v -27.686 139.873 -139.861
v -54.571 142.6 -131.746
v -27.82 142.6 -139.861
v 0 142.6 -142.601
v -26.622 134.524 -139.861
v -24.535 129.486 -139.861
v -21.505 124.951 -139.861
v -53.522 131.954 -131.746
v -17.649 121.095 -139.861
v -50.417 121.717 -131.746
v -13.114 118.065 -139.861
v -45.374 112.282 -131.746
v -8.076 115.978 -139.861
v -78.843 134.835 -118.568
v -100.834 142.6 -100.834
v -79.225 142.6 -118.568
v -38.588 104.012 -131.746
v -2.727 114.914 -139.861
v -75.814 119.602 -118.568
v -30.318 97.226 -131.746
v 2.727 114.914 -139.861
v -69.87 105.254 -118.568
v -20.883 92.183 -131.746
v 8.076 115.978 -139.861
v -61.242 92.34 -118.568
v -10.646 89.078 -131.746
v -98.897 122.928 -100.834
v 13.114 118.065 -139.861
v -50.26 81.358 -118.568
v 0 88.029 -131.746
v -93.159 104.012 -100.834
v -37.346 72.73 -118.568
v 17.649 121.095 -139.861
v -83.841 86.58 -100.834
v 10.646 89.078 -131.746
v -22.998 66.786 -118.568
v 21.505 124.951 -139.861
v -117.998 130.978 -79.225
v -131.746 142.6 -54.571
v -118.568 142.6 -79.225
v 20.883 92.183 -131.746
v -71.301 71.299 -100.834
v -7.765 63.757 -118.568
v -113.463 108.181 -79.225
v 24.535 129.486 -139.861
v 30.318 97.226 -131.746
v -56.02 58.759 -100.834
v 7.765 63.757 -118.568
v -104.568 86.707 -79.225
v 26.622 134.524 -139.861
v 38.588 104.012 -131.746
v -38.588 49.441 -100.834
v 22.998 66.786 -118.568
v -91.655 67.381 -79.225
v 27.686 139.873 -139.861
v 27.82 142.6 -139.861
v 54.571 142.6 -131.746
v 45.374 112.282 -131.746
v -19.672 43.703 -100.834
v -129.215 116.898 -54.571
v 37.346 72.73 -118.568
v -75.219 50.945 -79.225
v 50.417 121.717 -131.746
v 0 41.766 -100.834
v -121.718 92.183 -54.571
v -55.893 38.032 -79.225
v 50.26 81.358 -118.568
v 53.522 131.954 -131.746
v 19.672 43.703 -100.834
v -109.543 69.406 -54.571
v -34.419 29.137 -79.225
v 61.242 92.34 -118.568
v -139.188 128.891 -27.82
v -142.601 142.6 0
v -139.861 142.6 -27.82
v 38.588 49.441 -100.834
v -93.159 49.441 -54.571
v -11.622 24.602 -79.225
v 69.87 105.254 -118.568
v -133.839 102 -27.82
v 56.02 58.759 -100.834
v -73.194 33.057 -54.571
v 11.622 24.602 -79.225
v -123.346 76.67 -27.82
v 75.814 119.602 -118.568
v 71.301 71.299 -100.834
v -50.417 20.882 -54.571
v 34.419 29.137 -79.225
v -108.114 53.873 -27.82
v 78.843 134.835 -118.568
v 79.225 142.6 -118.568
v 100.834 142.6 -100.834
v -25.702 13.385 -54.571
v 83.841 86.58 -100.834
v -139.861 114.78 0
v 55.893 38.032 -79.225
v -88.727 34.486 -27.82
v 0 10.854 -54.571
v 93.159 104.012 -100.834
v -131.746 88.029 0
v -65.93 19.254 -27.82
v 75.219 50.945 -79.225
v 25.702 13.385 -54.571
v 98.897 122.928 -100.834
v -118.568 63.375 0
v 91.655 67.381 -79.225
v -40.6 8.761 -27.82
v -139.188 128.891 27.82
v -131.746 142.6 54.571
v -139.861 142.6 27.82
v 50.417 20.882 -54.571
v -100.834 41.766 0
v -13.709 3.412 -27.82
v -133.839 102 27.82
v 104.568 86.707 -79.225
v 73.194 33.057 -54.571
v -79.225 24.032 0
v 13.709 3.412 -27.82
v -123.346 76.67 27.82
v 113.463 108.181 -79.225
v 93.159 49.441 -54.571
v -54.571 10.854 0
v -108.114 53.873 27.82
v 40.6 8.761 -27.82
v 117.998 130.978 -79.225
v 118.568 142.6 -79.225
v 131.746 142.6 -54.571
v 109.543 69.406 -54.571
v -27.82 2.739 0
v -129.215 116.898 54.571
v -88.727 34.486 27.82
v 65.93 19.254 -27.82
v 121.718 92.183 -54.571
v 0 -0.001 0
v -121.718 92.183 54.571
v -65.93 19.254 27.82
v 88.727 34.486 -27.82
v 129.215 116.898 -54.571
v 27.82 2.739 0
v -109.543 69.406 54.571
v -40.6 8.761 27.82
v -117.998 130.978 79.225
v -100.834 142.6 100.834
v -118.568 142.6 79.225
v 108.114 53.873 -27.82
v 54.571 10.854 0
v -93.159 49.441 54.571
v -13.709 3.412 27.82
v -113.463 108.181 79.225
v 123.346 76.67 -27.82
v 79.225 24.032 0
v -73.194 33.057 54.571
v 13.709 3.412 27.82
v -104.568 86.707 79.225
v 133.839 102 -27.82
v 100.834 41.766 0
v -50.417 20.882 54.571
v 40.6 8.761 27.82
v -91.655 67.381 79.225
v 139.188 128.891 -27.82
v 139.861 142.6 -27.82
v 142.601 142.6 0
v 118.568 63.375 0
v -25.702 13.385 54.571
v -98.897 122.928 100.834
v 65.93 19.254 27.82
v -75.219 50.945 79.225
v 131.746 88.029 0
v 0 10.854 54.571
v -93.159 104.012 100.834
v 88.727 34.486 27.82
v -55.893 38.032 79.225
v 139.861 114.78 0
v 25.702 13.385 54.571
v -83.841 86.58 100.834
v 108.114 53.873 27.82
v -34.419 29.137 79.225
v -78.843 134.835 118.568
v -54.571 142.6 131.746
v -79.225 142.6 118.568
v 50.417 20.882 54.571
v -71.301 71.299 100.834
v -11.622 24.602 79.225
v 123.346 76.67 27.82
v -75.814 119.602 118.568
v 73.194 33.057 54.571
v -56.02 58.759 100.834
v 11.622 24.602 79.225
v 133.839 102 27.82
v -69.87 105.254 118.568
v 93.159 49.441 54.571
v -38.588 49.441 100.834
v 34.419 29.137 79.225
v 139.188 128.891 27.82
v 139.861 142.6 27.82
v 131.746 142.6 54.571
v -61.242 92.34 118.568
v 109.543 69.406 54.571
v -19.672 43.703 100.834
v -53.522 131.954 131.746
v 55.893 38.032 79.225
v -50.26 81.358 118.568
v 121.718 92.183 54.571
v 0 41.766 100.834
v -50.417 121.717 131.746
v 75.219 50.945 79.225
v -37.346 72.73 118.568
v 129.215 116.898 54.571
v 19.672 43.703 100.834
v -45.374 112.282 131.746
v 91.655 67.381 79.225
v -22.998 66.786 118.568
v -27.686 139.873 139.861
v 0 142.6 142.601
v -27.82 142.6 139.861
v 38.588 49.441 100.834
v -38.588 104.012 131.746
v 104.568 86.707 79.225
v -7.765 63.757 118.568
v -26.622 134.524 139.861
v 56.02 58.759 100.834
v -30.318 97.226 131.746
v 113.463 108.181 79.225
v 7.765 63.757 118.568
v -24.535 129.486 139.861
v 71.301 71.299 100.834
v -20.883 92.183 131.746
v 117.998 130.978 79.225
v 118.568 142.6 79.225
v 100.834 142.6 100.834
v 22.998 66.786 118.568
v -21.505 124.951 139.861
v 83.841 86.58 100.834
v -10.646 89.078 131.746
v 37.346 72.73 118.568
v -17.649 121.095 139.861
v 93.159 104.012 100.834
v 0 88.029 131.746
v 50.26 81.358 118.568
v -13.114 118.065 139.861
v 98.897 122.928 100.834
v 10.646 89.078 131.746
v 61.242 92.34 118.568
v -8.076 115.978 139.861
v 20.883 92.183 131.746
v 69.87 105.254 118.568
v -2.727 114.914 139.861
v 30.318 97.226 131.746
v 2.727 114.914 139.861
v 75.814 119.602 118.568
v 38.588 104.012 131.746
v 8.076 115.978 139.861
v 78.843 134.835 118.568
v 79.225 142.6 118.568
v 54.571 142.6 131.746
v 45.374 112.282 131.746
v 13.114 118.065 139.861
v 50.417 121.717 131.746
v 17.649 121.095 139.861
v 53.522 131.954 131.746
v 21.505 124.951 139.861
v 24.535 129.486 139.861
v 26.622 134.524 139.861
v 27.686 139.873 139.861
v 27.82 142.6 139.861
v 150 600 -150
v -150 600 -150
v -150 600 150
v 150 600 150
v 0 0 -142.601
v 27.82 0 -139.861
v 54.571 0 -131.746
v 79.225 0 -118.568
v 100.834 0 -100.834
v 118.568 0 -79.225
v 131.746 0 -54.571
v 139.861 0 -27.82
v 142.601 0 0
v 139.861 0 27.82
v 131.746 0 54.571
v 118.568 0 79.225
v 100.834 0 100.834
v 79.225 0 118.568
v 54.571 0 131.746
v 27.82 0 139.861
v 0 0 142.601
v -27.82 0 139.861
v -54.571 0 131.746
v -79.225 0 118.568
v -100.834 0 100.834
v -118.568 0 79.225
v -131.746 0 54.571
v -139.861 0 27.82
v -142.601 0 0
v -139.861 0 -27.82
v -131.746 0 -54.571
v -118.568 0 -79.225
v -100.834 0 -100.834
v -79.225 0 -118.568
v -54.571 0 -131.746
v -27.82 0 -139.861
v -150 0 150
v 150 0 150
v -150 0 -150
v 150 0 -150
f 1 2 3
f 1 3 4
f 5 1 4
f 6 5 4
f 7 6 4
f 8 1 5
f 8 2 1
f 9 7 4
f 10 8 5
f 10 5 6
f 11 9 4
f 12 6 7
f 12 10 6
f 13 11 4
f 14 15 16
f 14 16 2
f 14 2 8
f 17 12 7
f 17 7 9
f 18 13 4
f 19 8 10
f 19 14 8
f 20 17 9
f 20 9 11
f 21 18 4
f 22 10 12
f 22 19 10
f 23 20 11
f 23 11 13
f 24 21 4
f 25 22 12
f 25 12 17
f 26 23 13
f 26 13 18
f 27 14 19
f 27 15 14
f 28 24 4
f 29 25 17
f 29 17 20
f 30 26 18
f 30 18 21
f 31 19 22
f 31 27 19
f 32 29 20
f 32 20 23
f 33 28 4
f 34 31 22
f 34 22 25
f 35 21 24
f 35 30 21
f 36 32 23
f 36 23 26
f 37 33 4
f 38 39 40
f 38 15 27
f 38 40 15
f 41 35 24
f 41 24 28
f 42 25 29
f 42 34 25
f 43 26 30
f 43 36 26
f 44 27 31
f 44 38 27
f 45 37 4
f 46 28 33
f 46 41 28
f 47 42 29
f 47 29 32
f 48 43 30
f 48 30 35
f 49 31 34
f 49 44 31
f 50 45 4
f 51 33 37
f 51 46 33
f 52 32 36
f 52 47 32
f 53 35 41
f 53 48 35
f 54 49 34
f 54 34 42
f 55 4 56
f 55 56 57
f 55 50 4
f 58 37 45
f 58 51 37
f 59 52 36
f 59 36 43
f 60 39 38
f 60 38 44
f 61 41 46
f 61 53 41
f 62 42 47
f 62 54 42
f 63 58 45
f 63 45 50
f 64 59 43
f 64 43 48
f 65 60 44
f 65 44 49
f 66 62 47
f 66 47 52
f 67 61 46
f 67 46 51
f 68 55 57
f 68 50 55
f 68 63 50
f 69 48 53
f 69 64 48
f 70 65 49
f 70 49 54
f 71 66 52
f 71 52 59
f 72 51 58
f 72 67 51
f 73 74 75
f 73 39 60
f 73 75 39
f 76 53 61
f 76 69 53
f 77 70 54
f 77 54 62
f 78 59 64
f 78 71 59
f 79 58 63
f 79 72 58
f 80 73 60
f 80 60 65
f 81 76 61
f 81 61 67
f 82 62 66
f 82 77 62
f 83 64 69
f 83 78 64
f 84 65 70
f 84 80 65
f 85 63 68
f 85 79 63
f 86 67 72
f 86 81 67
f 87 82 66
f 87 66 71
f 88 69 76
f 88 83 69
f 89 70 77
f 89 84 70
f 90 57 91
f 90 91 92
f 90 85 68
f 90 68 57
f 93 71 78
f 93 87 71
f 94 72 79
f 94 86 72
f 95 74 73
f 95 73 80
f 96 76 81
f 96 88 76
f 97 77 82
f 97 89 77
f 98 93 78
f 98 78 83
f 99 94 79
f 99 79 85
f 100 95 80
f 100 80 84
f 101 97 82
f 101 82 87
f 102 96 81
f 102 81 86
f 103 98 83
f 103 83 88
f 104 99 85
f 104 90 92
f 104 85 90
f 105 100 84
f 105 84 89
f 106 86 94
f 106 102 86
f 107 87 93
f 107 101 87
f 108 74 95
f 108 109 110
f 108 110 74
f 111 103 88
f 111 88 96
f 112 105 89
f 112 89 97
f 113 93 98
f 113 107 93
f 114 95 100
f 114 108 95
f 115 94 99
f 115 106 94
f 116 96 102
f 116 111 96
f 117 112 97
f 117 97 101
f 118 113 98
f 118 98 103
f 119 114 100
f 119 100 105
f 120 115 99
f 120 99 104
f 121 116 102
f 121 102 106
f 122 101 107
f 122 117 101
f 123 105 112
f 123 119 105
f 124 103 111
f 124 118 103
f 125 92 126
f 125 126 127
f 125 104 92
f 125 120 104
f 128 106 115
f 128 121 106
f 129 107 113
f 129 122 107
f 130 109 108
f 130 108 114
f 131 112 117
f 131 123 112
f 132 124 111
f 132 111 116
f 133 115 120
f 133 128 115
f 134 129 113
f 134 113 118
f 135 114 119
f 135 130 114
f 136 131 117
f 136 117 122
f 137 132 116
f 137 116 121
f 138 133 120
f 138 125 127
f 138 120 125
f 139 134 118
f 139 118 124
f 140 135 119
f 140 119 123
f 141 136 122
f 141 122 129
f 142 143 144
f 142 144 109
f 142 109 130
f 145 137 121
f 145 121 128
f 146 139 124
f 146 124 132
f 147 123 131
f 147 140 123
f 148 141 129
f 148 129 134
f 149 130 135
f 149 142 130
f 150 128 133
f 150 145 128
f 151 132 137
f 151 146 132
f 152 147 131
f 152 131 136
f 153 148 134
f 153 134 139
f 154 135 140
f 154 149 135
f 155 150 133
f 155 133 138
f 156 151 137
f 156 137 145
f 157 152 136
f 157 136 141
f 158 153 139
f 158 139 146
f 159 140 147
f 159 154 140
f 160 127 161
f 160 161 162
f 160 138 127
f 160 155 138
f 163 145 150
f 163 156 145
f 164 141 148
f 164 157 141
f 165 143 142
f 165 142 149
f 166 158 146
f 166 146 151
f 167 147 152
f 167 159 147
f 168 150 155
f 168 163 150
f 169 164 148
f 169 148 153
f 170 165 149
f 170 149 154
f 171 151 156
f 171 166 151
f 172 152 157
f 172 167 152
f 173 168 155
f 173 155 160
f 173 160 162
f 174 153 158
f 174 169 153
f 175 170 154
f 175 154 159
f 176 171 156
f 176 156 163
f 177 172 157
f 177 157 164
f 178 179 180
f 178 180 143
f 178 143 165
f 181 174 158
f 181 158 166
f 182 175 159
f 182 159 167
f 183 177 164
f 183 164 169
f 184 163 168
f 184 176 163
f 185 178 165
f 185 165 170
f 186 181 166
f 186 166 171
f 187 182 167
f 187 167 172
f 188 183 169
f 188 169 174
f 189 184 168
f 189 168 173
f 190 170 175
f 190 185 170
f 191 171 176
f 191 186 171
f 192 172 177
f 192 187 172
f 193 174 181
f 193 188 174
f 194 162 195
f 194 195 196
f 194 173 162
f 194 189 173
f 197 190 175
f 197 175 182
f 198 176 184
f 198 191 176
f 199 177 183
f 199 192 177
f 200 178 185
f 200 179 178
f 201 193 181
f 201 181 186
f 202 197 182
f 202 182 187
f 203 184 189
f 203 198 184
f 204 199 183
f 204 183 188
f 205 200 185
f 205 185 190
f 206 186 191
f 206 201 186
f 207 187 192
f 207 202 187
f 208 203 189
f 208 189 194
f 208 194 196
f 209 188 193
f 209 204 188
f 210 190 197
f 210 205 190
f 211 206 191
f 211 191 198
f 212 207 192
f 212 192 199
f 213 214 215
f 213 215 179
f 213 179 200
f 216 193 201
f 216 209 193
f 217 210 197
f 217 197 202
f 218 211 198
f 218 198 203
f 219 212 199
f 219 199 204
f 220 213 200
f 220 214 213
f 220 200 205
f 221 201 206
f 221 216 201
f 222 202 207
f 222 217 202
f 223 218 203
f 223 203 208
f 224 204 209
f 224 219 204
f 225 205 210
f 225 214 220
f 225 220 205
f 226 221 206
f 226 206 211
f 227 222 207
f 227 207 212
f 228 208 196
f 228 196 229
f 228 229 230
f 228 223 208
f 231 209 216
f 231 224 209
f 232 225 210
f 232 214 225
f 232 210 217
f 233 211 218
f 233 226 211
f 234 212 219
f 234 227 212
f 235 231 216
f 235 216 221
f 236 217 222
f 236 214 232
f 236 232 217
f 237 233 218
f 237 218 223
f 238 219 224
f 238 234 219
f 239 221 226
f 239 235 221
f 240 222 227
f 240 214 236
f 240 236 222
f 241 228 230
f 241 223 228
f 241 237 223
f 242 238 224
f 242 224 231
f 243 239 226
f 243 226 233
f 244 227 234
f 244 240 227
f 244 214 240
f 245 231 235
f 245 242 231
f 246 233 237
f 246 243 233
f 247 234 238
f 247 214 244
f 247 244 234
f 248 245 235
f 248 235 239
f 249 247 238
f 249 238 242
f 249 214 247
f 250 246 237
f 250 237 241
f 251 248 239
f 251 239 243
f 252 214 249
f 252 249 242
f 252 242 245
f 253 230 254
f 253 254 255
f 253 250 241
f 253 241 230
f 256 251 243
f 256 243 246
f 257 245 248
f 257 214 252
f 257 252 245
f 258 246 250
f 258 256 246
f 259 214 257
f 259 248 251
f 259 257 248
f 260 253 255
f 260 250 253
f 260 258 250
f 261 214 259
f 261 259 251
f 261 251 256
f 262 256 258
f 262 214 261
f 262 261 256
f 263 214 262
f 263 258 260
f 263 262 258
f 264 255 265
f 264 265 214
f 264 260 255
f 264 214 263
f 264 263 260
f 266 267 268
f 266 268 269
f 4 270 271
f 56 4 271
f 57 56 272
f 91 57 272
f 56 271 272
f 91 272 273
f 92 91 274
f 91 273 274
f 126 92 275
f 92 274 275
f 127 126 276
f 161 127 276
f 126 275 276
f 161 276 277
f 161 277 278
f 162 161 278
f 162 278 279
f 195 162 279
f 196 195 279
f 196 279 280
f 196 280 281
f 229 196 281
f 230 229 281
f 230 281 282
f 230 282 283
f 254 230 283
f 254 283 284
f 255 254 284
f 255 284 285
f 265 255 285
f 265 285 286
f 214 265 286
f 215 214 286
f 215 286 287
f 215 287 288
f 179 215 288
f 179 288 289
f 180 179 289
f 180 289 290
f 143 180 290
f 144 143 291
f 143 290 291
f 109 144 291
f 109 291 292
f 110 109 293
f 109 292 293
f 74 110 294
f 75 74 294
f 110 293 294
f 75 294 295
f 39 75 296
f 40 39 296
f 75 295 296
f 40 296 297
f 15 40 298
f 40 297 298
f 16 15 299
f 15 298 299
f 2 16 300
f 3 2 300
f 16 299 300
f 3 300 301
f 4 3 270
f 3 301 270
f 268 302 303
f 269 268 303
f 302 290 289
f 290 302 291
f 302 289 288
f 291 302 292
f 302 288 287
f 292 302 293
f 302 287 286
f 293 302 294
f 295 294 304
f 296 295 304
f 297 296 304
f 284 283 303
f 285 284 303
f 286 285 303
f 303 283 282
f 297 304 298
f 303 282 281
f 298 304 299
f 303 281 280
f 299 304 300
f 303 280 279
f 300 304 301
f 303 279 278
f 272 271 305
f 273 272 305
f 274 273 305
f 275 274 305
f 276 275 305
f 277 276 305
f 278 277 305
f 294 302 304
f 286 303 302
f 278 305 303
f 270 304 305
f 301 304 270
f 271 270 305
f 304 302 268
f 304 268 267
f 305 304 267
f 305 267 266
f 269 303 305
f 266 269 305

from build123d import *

# Parameters (mm, degrees)
SKETCH1_W           = 300
SKETCH1_H           = 300
BOSS_EXTRUDE1_DEPTH = 600
SKETCH2_R           = 142.6010694
CUT_EXTRUDE1_DEPTH  = 142.6
REVOLVE1_ANGLE      = 180


with BuildPart() as part:
    # Sketch1 → Boss-Extrude1 (new body)
    with BuildSketch(Plane(origin=(0, 0, 0), x_dir=(1, 0, 0), z_dir=(0, 1, 0))):
        Rectangle(SKETCH1_W, SKETCH1_H)
    extrude(amount=BOSS_EXTRUDE1_DEPTH)

    # Sketch2 → Cut-Extrude1 (cut)
    with BuildSketch(Plane.XZ):
        with Locations(Location((0, 0, 0), (0, 0, 270))):
            Circle(SKETCH2_R)
    extrude(amount=-CUT_EXTRUDE1_DEPTH, mode=Mode.SUBTRACT)

    # Sketch3 → Revolve1 (revolve)
    with BuildSketch(Plane.XZ.offset(-142.6)):
        with BuildLine():
            Line((0, 142.601069387), (0, -142.601069387))
            ThreePointArc((0, -142.601069387), (-142.601069387, 0), (0, 142.601069387))
        make_face()
    revolve(axis=Axis((0, 142.6, 142.601069387), (0, 0, 1)), revolution_arc=REVOLVE1_ANGLE)


solid = part.part
